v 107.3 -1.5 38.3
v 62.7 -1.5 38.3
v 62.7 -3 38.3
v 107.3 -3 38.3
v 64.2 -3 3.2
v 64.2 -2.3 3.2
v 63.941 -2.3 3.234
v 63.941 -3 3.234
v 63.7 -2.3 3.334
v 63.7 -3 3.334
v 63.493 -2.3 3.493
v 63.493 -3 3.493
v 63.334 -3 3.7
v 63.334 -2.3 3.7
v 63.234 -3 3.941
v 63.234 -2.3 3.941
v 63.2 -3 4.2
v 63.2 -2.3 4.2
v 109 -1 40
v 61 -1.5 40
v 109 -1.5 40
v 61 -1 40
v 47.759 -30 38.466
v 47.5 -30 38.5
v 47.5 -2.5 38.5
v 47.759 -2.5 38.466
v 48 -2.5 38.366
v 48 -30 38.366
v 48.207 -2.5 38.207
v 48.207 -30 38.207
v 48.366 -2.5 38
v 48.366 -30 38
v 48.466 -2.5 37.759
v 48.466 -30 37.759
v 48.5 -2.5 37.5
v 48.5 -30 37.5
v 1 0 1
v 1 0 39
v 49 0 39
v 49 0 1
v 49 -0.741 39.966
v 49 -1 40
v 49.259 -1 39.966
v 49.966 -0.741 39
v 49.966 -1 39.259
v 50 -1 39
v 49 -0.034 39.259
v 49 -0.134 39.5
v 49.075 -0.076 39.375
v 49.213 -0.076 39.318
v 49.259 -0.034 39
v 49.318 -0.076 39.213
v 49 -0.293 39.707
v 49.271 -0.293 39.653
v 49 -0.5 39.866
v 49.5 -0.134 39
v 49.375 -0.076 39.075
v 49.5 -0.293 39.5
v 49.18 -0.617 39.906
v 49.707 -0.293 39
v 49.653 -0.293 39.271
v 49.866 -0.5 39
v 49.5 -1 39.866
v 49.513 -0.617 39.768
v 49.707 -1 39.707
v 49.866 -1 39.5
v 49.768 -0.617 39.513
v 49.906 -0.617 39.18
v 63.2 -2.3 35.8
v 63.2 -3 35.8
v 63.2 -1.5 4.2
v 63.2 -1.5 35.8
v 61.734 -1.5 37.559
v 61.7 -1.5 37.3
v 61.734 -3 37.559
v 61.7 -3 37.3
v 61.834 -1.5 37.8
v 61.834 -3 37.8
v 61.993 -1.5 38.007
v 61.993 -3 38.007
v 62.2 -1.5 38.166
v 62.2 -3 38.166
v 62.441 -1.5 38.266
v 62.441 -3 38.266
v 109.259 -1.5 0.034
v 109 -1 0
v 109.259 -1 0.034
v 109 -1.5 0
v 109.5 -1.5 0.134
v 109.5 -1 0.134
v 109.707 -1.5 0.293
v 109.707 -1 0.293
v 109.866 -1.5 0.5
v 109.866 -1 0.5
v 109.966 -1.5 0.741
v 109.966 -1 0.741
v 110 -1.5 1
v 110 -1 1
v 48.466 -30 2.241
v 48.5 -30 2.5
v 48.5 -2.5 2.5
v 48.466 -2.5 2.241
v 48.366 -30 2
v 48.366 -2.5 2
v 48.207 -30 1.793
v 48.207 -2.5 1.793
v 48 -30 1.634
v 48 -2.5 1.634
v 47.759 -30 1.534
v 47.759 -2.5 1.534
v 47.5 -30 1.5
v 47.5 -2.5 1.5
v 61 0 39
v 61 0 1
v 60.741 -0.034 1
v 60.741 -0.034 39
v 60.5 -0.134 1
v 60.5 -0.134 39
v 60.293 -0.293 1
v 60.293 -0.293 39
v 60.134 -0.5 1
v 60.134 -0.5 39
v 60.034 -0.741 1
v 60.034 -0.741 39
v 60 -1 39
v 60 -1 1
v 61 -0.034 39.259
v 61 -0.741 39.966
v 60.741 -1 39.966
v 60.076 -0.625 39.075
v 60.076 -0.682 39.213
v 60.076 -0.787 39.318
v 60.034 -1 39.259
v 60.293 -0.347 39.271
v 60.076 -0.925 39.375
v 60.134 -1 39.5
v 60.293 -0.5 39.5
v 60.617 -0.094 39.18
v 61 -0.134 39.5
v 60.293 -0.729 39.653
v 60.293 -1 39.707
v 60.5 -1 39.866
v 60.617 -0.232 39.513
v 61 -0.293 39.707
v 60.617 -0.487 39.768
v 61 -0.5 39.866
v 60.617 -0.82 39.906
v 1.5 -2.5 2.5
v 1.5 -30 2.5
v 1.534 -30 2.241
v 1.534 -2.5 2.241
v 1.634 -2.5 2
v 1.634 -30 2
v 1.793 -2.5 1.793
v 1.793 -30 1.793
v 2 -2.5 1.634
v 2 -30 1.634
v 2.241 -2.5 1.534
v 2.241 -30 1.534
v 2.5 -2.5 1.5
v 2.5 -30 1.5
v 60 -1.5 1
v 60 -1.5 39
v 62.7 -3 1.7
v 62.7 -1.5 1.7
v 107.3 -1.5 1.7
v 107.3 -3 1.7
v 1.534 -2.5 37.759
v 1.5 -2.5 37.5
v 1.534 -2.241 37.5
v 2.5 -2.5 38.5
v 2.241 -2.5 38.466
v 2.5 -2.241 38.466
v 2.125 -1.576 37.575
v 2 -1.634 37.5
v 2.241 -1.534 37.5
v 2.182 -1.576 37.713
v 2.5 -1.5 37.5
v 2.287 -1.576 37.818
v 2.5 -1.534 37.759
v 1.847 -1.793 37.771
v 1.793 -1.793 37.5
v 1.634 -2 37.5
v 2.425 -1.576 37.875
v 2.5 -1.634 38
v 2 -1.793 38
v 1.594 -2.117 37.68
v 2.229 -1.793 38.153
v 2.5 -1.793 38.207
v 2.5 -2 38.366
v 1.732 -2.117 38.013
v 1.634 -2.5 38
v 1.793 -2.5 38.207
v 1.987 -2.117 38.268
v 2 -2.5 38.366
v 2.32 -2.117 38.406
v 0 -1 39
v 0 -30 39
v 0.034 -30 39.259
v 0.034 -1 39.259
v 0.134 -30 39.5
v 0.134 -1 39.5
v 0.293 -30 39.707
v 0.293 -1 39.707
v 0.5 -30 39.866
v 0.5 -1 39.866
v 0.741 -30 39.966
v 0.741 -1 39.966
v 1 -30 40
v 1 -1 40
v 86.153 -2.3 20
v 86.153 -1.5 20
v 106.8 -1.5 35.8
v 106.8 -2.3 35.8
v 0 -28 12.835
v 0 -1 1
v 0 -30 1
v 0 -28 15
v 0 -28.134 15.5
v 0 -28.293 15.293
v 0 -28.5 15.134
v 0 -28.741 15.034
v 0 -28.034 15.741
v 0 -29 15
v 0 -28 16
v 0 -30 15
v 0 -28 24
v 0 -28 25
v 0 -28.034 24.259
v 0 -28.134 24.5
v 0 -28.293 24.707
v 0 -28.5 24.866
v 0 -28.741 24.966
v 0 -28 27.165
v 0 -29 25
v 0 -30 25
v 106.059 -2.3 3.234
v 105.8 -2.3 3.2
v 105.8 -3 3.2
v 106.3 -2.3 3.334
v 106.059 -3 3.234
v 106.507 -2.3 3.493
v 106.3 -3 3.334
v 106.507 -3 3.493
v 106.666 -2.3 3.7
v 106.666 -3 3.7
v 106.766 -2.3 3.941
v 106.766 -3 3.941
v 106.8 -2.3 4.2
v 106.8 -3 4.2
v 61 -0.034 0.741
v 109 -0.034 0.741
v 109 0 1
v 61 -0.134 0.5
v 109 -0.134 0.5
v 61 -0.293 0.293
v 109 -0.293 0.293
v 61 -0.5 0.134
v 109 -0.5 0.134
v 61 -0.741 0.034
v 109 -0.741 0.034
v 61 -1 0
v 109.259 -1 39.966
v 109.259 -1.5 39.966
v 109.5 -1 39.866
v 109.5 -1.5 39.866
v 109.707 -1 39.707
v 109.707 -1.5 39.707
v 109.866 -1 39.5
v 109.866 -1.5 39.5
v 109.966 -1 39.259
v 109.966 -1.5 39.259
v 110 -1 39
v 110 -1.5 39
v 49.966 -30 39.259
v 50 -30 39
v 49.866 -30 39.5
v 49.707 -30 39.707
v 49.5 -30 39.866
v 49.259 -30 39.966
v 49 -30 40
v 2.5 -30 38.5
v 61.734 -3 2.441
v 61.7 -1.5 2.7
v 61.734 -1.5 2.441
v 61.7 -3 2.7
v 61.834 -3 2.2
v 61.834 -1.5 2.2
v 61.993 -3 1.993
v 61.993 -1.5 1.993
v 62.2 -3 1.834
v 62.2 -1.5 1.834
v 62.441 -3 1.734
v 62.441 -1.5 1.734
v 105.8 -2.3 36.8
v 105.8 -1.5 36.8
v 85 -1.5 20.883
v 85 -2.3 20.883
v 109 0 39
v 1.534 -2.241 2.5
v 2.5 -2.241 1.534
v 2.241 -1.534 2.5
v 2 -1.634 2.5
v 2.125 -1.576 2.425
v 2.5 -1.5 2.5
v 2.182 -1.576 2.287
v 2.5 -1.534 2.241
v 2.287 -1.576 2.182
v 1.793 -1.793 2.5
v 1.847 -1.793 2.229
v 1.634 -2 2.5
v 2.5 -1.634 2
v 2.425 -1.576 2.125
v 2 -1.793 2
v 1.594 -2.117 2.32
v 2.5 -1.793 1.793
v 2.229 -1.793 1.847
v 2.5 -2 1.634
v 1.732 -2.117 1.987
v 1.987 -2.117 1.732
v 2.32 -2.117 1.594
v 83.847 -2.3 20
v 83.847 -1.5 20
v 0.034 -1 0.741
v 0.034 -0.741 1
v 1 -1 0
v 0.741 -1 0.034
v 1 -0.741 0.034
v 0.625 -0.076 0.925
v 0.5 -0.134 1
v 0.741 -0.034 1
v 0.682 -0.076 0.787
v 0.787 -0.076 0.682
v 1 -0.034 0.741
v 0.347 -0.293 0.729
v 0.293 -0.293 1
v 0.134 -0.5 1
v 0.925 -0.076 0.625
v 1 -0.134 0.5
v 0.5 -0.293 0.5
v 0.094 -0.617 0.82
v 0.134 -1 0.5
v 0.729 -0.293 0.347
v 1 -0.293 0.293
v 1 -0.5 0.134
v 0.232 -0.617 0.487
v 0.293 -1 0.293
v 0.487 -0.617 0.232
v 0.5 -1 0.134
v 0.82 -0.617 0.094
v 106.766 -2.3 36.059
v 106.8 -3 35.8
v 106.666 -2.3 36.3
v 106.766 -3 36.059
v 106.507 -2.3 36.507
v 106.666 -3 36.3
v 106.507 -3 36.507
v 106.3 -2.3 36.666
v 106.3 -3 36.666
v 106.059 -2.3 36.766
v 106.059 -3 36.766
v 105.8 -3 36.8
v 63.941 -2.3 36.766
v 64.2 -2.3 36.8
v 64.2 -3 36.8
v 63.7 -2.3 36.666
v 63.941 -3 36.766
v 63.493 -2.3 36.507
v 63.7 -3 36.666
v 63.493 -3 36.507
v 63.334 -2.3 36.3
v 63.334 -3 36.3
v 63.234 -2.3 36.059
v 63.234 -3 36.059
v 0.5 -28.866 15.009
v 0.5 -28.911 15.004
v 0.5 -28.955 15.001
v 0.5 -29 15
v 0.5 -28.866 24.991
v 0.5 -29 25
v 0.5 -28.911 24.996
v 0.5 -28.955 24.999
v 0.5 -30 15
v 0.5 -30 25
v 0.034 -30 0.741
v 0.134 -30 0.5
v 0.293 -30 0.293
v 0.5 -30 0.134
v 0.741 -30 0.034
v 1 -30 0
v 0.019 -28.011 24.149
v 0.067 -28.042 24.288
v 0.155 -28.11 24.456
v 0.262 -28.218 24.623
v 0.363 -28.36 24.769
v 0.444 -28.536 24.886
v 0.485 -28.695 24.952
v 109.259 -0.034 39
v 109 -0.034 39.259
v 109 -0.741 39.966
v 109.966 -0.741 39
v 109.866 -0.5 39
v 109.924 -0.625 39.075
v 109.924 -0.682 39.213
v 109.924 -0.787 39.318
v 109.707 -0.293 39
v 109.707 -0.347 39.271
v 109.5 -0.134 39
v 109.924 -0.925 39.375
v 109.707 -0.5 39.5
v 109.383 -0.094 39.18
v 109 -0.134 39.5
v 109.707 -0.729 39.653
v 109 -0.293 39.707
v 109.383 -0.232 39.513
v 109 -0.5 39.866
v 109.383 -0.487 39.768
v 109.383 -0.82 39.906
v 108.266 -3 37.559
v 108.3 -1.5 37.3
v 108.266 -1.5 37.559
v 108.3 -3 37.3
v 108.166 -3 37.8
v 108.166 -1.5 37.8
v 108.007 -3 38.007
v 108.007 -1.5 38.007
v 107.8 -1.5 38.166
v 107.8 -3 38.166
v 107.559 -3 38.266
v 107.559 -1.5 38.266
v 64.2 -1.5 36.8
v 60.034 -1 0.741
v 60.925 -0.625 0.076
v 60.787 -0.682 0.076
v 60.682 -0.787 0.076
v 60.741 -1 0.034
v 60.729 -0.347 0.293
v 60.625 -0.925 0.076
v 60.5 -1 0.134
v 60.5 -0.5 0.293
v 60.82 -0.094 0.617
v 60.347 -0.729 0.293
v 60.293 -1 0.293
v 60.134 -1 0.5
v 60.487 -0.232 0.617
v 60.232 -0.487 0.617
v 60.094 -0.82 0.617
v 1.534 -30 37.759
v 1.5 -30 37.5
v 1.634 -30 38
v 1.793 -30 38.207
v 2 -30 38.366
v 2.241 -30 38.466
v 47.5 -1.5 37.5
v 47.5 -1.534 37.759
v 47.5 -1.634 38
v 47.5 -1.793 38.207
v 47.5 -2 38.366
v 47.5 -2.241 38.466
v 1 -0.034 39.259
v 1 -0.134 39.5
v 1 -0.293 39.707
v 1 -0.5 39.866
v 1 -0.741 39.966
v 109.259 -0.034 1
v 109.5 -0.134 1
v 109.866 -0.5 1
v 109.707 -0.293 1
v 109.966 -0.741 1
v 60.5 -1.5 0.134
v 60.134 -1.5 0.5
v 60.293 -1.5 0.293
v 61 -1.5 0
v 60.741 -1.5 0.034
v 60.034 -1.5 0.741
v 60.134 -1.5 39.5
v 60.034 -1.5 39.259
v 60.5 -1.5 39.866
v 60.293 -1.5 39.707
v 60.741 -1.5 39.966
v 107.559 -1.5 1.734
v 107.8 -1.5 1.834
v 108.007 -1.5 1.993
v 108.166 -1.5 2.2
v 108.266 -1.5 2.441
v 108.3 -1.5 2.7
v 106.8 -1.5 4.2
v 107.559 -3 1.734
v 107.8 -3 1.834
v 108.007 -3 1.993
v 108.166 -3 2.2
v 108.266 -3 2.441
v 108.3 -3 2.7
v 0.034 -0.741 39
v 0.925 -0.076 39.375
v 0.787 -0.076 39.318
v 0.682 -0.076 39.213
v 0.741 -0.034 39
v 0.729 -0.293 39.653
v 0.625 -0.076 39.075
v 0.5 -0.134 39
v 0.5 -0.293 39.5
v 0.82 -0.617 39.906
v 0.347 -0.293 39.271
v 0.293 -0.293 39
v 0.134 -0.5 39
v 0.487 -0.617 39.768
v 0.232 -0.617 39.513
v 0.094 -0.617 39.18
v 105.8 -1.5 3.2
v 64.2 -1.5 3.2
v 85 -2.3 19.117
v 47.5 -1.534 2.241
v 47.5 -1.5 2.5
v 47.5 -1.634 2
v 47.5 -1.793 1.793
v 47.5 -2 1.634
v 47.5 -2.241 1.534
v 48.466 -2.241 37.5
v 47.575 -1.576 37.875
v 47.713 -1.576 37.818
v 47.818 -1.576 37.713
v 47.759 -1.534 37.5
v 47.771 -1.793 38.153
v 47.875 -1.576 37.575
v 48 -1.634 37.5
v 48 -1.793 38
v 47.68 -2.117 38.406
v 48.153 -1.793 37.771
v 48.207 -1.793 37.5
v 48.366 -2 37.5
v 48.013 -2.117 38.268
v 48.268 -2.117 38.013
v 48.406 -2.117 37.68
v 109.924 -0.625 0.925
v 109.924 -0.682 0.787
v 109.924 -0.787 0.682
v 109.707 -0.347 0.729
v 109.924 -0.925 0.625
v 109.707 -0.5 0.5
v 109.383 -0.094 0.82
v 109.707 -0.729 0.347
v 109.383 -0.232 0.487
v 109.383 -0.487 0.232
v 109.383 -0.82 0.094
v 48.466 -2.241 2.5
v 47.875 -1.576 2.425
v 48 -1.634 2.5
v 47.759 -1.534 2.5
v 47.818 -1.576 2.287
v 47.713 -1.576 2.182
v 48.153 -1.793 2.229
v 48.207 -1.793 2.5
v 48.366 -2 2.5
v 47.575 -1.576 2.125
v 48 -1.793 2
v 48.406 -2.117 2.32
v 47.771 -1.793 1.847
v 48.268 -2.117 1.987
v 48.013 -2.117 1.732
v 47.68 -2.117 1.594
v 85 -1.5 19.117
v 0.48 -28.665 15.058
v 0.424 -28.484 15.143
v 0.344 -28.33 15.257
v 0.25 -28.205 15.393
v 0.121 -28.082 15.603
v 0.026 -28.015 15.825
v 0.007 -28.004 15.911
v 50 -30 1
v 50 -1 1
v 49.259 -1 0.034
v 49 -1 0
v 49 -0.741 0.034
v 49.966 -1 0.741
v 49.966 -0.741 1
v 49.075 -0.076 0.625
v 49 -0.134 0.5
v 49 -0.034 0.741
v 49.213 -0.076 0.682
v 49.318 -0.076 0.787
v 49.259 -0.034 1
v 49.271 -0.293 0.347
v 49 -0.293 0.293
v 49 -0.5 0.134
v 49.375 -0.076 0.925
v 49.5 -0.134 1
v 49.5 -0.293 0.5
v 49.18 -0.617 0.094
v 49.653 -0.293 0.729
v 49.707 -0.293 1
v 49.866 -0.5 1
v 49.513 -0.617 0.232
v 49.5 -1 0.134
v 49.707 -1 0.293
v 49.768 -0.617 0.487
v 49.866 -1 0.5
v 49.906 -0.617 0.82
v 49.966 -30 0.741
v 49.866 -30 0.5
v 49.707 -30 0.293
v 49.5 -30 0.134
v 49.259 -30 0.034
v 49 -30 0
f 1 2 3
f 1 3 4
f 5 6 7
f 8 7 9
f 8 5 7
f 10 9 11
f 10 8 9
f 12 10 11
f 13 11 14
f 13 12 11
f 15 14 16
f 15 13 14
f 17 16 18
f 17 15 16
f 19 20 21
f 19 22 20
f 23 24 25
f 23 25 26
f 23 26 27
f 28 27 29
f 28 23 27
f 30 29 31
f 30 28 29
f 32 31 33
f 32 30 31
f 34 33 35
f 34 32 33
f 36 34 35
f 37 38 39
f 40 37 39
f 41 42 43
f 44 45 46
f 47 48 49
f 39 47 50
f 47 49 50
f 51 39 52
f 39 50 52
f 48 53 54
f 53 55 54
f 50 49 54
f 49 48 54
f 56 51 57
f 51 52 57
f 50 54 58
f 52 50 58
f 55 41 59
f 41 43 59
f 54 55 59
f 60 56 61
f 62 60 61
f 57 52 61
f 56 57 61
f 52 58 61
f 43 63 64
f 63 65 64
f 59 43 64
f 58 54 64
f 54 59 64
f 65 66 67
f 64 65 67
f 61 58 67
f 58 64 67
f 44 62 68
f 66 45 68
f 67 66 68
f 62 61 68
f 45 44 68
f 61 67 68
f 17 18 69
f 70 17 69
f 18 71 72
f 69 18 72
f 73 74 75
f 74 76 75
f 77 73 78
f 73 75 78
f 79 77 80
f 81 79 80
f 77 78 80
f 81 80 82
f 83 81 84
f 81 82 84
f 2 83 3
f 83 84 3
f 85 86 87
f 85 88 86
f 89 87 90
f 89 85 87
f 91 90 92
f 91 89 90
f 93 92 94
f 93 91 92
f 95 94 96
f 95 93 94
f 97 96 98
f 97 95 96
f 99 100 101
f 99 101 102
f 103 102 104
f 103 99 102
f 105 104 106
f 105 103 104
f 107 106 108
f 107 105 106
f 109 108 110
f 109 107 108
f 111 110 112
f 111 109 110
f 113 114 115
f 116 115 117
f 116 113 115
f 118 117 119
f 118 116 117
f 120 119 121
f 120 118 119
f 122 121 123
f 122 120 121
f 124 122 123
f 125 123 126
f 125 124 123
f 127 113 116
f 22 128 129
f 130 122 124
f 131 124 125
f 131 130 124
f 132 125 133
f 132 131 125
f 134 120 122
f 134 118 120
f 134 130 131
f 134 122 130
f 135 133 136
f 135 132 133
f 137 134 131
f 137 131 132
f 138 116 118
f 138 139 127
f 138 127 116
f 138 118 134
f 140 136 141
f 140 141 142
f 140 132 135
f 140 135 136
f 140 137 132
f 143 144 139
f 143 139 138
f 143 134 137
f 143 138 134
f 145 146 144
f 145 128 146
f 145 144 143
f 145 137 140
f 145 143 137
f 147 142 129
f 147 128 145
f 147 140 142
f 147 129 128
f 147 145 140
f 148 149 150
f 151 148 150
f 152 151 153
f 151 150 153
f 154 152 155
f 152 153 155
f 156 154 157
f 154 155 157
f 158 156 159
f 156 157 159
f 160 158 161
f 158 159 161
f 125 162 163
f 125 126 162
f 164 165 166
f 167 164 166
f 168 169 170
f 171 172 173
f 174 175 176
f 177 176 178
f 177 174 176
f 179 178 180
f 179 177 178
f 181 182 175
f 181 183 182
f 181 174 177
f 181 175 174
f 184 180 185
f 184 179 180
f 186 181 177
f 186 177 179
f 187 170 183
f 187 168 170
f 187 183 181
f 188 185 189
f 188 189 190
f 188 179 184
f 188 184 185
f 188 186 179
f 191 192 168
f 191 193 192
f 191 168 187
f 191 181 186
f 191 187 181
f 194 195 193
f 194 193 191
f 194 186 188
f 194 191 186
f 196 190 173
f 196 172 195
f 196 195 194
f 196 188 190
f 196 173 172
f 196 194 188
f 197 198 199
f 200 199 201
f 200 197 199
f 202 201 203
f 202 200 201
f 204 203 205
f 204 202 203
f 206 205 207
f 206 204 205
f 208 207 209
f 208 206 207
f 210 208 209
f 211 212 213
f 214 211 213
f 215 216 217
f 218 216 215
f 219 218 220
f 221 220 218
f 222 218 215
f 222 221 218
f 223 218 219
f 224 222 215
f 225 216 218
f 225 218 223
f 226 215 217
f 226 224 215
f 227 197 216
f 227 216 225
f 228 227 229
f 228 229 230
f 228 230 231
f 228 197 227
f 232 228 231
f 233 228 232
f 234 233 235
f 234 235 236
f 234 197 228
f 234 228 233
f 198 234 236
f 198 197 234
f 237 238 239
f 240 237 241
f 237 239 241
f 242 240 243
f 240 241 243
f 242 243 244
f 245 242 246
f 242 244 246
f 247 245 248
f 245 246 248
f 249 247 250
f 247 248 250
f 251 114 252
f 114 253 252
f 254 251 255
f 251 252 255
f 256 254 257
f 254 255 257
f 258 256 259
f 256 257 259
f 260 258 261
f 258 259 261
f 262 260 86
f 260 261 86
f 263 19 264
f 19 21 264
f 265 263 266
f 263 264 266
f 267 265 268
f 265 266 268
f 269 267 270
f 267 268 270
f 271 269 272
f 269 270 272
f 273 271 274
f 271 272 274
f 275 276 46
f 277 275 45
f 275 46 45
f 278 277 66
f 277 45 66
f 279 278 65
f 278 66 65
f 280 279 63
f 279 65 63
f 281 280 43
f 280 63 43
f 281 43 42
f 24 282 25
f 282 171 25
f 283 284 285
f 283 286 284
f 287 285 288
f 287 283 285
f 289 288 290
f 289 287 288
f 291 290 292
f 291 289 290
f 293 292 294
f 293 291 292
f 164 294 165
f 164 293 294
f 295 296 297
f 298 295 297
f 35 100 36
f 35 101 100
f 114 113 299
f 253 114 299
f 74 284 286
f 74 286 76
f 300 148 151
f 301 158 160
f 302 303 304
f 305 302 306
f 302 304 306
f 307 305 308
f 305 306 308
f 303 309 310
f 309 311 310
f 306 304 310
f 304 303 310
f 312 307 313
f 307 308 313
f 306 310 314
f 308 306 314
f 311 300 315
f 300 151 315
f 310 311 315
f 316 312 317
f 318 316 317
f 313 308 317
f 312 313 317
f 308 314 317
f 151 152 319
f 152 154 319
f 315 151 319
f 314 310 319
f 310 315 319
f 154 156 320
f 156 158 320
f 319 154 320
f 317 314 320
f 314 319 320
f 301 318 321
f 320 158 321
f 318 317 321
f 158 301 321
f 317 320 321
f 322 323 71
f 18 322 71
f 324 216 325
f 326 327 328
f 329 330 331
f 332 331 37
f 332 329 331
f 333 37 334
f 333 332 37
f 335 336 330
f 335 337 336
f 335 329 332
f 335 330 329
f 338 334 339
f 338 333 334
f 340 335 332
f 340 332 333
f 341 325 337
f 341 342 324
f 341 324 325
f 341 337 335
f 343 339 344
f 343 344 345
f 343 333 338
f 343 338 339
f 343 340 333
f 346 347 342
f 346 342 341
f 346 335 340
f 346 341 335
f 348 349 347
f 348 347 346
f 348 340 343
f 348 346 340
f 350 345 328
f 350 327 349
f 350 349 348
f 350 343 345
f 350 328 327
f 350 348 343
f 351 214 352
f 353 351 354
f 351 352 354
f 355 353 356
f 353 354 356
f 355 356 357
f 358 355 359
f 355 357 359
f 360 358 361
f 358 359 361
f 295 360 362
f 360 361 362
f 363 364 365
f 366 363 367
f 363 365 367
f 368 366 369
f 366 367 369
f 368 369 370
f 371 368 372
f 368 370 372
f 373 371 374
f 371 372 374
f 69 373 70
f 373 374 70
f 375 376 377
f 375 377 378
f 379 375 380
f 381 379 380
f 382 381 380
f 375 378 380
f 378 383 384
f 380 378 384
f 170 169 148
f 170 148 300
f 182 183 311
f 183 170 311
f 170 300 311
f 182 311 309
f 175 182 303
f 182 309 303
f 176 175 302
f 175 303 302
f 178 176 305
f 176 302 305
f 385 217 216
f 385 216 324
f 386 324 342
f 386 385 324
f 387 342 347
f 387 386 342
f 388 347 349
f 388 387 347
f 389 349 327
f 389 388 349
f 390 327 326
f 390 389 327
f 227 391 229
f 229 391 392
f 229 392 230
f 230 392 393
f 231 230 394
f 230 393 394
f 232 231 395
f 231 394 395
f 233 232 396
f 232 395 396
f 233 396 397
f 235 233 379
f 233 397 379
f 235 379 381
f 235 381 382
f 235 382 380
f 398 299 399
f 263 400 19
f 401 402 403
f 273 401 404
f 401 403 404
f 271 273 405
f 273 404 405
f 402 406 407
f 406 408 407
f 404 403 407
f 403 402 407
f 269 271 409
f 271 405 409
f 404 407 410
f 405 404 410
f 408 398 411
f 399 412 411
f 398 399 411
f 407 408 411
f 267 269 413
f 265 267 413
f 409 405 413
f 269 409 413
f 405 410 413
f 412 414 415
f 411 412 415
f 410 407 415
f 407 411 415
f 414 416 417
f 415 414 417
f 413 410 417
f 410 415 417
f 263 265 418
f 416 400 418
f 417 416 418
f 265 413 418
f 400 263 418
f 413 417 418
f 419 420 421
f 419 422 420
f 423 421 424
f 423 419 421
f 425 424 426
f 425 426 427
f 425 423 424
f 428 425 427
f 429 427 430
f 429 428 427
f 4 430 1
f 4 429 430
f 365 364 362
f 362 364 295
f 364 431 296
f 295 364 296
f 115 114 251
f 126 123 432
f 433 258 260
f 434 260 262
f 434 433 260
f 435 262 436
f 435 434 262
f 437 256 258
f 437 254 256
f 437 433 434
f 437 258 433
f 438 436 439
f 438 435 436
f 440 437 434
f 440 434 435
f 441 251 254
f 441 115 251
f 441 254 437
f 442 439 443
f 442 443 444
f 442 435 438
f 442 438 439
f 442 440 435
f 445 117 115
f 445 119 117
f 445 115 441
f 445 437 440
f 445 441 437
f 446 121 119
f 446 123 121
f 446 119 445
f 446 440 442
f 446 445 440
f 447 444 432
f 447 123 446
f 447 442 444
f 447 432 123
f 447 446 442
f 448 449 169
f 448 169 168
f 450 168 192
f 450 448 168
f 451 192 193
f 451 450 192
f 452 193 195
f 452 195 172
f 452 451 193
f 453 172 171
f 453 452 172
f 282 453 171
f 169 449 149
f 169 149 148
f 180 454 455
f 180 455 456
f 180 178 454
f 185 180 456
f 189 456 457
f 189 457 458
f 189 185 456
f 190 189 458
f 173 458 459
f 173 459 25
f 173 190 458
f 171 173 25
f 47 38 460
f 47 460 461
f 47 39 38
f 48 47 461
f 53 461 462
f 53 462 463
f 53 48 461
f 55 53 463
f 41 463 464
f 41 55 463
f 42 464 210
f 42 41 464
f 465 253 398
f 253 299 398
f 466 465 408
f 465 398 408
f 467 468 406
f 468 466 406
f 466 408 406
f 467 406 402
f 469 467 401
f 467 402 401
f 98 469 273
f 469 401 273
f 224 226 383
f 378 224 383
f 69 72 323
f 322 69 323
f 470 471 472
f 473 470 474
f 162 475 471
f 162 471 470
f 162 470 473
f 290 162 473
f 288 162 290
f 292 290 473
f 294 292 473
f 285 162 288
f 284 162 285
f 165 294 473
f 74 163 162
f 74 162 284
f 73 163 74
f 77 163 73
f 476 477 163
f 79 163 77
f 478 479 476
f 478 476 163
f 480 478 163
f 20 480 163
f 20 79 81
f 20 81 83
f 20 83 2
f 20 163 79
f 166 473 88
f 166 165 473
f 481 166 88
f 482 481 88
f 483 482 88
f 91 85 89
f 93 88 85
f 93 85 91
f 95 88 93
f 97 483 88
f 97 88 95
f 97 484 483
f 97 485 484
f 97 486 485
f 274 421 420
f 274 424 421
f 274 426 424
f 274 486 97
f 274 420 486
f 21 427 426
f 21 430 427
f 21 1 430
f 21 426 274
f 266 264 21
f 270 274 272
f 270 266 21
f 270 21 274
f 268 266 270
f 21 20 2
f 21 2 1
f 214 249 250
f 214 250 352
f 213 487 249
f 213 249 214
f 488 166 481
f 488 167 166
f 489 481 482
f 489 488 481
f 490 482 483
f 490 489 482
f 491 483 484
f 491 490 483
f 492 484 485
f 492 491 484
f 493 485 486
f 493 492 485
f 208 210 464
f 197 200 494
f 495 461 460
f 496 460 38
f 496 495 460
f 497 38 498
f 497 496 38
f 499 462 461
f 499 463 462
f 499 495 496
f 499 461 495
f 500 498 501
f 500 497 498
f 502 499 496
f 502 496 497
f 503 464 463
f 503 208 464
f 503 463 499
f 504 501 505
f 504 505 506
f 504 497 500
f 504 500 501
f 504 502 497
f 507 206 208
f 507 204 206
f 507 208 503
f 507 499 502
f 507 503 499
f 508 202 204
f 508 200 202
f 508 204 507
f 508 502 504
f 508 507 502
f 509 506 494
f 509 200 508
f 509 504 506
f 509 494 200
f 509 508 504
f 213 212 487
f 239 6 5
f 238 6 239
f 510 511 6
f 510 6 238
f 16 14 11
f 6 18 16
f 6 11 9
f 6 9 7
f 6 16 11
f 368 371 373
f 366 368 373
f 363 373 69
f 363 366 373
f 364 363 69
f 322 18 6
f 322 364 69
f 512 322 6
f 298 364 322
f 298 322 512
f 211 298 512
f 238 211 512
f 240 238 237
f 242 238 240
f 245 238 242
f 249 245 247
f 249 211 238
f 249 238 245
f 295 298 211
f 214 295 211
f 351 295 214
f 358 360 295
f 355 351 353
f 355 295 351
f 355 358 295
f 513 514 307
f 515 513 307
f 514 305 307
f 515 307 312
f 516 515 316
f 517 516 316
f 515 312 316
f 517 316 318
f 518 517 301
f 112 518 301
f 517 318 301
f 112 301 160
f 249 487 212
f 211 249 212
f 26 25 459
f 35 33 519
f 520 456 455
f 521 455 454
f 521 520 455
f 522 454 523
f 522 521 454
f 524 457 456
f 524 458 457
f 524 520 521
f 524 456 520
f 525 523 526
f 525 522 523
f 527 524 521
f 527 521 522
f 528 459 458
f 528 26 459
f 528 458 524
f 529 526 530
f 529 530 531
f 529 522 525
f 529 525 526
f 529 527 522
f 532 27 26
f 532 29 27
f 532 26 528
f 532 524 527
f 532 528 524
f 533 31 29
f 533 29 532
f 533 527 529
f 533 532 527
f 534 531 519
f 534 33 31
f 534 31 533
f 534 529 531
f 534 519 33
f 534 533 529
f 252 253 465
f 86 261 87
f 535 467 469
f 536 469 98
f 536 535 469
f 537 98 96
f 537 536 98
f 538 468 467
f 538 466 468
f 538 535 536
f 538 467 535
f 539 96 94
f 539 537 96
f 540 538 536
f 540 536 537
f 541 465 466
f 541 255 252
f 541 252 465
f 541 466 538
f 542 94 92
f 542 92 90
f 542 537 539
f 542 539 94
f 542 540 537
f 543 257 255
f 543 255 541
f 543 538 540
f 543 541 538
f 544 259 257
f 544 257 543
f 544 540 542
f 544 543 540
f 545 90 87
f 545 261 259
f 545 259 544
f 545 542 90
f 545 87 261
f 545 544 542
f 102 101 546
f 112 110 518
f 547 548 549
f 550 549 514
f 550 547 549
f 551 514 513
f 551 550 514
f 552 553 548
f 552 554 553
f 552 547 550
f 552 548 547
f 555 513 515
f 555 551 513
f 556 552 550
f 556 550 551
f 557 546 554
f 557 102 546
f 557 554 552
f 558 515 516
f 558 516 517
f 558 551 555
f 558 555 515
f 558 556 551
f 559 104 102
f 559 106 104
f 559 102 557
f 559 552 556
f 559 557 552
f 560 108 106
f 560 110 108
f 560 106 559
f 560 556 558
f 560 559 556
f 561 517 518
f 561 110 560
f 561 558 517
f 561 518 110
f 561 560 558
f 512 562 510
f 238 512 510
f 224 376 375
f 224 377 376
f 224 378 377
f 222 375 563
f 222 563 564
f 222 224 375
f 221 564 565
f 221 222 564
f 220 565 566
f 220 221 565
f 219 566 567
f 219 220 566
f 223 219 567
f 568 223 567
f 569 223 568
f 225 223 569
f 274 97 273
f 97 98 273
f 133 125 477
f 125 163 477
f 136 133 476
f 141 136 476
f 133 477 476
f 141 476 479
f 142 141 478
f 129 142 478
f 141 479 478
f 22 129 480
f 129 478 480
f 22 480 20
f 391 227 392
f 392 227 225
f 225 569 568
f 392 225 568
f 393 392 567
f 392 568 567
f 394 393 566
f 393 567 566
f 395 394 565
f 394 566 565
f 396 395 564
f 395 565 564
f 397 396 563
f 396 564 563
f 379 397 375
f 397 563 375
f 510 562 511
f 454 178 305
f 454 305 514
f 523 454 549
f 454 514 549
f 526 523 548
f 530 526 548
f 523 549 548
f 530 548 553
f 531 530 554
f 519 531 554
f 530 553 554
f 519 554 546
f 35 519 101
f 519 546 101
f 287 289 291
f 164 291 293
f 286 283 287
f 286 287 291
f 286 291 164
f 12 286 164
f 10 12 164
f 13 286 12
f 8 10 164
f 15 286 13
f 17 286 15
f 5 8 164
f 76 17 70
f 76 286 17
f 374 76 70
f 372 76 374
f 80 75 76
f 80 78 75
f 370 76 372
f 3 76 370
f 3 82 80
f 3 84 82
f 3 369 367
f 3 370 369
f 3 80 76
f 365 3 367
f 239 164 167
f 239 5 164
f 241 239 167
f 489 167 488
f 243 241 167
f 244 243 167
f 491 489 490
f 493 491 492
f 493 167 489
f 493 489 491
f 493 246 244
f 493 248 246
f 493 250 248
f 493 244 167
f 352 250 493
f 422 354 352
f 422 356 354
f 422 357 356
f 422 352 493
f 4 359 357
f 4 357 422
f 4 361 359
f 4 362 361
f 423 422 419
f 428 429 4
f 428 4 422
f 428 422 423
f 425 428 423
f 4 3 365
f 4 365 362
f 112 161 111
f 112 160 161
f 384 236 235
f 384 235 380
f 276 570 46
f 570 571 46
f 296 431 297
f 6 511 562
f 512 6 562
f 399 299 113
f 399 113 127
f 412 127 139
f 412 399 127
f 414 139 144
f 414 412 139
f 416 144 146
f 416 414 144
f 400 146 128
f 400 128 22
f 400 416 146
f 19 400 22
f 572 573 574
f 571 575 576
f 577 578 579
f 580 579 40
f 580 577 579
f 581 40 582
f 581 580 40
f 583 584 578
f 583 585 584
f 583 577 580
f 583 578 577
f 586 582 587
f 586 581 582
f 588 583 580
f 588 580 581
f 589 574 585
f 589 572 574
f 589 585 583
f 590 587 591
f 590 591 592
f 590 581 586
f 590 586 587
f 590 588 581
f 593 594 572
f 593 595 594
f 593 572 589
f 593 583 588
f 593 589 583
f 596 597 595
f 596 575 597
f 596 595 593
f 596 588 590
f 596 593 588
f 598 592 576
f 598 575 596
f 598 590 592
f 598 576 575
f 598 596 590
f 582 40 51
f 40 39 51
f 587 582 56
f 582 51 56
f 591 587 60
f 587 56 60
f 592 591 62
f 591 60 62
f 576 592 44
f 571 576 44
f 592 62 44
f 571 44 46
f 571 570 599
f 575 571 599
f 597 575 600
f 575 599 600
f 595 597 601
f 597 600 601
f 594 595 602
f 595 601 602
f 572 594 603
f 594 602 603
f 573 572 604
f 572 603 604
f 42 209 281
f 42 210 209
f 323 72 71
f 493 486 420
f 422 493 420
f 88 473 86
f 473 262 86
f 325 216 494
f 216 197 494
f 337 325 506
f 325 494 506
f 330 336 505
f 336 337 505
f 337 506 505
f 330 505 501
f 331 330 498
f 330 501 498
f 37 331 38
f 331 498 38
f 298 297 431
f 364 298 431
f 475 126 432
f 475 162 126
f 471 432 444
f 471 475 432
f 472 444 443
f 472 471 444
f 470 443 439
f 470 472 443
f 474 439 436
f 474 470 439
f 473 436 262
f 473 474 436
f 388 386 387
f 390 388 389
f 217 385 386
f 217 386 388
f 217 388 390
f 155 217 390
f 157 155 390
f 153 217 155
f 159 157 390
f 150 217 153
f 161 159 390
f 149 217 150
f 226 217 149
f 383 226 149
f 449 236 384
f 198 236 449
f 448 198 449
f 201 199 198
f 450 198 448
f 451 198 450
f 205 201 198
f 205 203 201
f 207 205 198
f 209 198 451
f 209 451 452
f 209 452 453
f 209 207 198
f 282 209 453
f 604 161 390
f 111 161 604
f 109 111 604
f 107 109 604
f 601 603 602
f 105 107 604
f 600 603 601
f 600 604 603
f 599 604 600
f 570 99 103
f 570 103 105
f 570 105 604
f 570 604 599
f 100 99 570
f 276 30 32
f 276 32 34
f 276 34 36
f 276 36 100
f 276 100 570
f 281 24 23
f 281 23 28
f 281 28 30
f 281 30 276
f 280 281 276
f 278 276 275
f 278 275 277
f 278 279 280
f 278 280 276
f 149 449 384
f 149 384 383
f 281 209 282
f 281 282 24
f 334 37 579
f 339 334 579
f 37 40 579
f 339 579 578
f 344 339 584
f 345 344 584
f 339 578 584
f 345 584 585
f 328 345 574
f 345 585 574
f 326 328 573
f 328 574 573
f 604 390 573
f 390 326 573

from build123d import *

# Parameters (mm, degrees)
F0_W         = 50
F0_H         = 40
F0_W_2       = 47
F0_H_2       = 37
F1_DEPTH     = 1.5
F0_W_3       = 46.6
F0_H_3       = 36.6
F0_W_4       = 43.6
F0_H_4       = 33.6
F2_DEPTH     = 30
F3_DEPTH     = 3
F4_R         = 1
F4_2_R       = 1
F6_DEPTH     = 0.8
F7_W         = 0.5
F7_H         = 10
F8_DEPTH     = 2
F9_T1_DEPTH  = 14.3301270189
F9_T6_DEPTH  = 3
F9_T11_DEPTH = 3


# Not quite as in the source:
# - a fillet or chamfer that OpenCascade refuses, or shapes differently, is made with other operations: its cross-section is extruded or revolved along the edge and cut away or added


with BuildPart() as f1:
    # F0 (on Front) → F1 (new body)
    with BuildSketch(Plane.XZ):
        with Locations((25, 20)):
            Rectangle(F0_W, F0_H)
        with Locations((25, 20)):
            Rectangle(F0_W_2, F0_H_2, mode=Mode.SUBTRACT)
        with Locations((25, 20)):
            Rectangle(F0_W_2, F0_H_2)
    extrude(amount=F1_DEPTH)

    # F0 (on Front) → F2 (join)
    with BuildSketch(Plane.XZ):
        with Locations((25, 20)):
            Rectangle(F0_W, F0_H)
        with Locations((25, 20)):
            Rectangle(F0_W_2, F0_H_2, mode=Mode.SUBTRACT)
    extrude(amount=F2_DEPTH)

    # F4
    f4_edges = [f1.edges().sort_by_distance(p)[0] for p in [
        (50, -15, 0),
        (0, -15, 0),
        (0, -15, 40),
        (50, -15, 40),
        (25, 0, 40),
        (0, 0, 20),
        (25, 0, 0),
        (50, 0, 20),
        (48.5, -15.75, 38.5),
        (48.5, -15.75, 1.5),
        (1.5, -15.75, 38.5),
        (1.5, -15.75, 1.5),
        (1.5, -1.5, 20),
        (25, -1.5, 38.5),
        (48.5, -1.5, 20),
        (25, -1.5, 1.5),
    ]]
    fillet(f4_edges, radius=F4_R)

    # F7 (on face) → F8 (cut)
    with BuildSketch(Plane.XZ.offset(30)):
        with Locations((0.25, 20)):
            Rectangle(F7_W, F7_H)
    extrude(amount=-F8_DEPTH, mode=Mode.SUBTRACT)

    # F9: fillet of radius 1 on 3 edges, made by hand

    # F9_s2 → F9_t1 (join)
    with BuildSketch(Plane.XY.offset(12.8349364905)):
        with BuildLine():
            ThreePointArc((0, -28), (0.3660254038, -28.3660254038), (0.5, -28.8660254038))
            Line((0.5, -28.8660254038), (0.5, -28))
            Line((0.5, -28), (0, -28))
        make_face()
    extrude(amount=F9_T1_DEPTH)


with BuildPart() as f1b:
    # F0 (on Front) → F1, piece 2 (new body)
    with BuildSketch(Plane.XZ):
        with Locations((85, 20)):
            Rectangle(F0_W, F0_H)
        with Locations((85, 20)):
            Rectangle(F0_W_3, F0_H_3, mode=Mode.SUBTRACT)
        with Locations((85, 20)):
            Rectangle(F0_W_3, F0_H_3)
        with Locations((85, 20)):
            Rectangle(F0_W_4, F0_H_4, mode=Mode.SUBTRACT)
        with Locations((85, 20)):
            Rectangle(F0_W_4, F0_H_4)
    extrude(amount=F1_DEPTH)

    # F0 (on Front) → F3 (join)
    with BuildSketch(Plane.XZ):
        with Locations((85, 20)):
            Rectangle(F0_W_3, F0_H_3)
        with Locations((85, 20)):
            Rectangle(F0_W_4, F0_H_4, mode=Mode.SUBTRACT)
    extrude(amount=F3_DEPTH)

    # F4#2
    f4_2_edges = [f1b.edges().sort_by_distance(p)[0] for p in [
        (85, 0, 40),
        (60, 0, 20),
        (85, 0, 0),
        (110, 0, 20),
        (60, -0.75, 0),
        (60, -0.75, 40),
        (110, -0.75, 40),
        (110, -0.75, 0),
        (61.7, -2.25, 1.7),
        (108.3, -2.25, 1.7),
        (108.3, -2.25, 38.3),
        (61.7, -2.25, 38.3),
        (63.2, -2.25, 36.8),
        (106.8, -2.25, 36.8),
        (106.8, -2.25, 3.2),
        (63.2, -2.25, 3.2),
    ]]
    fillet(f4_2_edges, radius=F4_2_R)

    # F5 (on face) → F6 (join)
    with BuildSketch(Plane.XZ.offset(1.5)):
        Polygon((85, 20.882629108), (83.8466257669, 20), (85, 19.117370892), (86.1533742331, 20), align=None)
        with BuildLine():
            Line((63.2, 35.8), (83.8466257669, 20))
            Line((83.8466257669, 20), (85, 20.882629108))
            Line((85, 20.882629108), (64.2, 36.8))
            ThreePointArc((64.2, 36.8), (63.4928932188, 36.5071067812), (63.2, 35.8))
        make_face()
        with BuildLine():
            Line((83.8466257669, 20), (63.2, 4.2))
            ThreePointArc((63.2, 4.2), (63.4928932188, 3.4928932188), (64.2, 3.2))
            Line((64.2, 3.2), (85, 19.117370892))
            Line((85, 19.117370892), (83.8466257669, 20))
        make_face()
        with BuildLine():
            Line((105.8, 36.8), (85, 20.882629108))
            Line((85, 20.882629108), (86.1533742331, 20))
            Line((86.1533742331, 20), (106.8, 35.8))
            ThreePointArc((106.8, 35.8), (106.5071067812, 36.5071067812), (105.8, 36.8))
        make_face()
        with BuildLine():
            Line((86.1533742331, 20), (85, 19.117370892))
            Line((85, 19.117370892), (105.8, 3.2))
            ThreePointArc((105.8, 3.2), (106.5071067812, 3.4928932188), (106.8, 4.2))
            Line((106.8, 4.2), (86.1533742331, 20))
        make_face()
    extrude(amount=F6_DEPTH)


with BuildPart() as f9_tool4:
    # F9_s5 → F9_t6 (new body)
    with BuildSketch(Plane.YZ):
        with BuildLine():
            ThreePointArc((-29, 15), (-28.2928932188, 15.2928932188), (-28, 16))
            Line((-28, 16), (-28, 15))
            Line((-28, 15), (-29, 15))
        make_face()
    extrude(amount=F9_T6_DEPTH)

    split(bisect_by=Plane.YZ.offset(1.5), keep=Keep.BOTTOM)


with BuildPart() as f1_1:
    add(f1.part)

    # F9_t3: union F9_tool4
    add(f9_tool4.part)


with BuildPart() as f9_tool9:
    # F9_s10 → F9_t11 (new body)
    with BuildSketch(Plane.YZ.offset(3)):
        with BuildLine():
            ThreePointArc((-28, 24), (-28.2928932188, 24.7071067812), (-29, 25))
            Line((-29, 25), (-28, 25))
            Line((-28, 25), (-28, 24))
        make_face()
    extrude(amount=-F9_T11_DEPTH)

    split(bisect_by=Plane.YZ.offset(1.5), keep=Keep.BOTTOM)


with BuildPart() as f1_2:
    add(f1_1.part)

    # F9_t8: union F9_tool9
    add(f9_tool9.part)


solid = Compound([f1b.part, f1_2.part])
